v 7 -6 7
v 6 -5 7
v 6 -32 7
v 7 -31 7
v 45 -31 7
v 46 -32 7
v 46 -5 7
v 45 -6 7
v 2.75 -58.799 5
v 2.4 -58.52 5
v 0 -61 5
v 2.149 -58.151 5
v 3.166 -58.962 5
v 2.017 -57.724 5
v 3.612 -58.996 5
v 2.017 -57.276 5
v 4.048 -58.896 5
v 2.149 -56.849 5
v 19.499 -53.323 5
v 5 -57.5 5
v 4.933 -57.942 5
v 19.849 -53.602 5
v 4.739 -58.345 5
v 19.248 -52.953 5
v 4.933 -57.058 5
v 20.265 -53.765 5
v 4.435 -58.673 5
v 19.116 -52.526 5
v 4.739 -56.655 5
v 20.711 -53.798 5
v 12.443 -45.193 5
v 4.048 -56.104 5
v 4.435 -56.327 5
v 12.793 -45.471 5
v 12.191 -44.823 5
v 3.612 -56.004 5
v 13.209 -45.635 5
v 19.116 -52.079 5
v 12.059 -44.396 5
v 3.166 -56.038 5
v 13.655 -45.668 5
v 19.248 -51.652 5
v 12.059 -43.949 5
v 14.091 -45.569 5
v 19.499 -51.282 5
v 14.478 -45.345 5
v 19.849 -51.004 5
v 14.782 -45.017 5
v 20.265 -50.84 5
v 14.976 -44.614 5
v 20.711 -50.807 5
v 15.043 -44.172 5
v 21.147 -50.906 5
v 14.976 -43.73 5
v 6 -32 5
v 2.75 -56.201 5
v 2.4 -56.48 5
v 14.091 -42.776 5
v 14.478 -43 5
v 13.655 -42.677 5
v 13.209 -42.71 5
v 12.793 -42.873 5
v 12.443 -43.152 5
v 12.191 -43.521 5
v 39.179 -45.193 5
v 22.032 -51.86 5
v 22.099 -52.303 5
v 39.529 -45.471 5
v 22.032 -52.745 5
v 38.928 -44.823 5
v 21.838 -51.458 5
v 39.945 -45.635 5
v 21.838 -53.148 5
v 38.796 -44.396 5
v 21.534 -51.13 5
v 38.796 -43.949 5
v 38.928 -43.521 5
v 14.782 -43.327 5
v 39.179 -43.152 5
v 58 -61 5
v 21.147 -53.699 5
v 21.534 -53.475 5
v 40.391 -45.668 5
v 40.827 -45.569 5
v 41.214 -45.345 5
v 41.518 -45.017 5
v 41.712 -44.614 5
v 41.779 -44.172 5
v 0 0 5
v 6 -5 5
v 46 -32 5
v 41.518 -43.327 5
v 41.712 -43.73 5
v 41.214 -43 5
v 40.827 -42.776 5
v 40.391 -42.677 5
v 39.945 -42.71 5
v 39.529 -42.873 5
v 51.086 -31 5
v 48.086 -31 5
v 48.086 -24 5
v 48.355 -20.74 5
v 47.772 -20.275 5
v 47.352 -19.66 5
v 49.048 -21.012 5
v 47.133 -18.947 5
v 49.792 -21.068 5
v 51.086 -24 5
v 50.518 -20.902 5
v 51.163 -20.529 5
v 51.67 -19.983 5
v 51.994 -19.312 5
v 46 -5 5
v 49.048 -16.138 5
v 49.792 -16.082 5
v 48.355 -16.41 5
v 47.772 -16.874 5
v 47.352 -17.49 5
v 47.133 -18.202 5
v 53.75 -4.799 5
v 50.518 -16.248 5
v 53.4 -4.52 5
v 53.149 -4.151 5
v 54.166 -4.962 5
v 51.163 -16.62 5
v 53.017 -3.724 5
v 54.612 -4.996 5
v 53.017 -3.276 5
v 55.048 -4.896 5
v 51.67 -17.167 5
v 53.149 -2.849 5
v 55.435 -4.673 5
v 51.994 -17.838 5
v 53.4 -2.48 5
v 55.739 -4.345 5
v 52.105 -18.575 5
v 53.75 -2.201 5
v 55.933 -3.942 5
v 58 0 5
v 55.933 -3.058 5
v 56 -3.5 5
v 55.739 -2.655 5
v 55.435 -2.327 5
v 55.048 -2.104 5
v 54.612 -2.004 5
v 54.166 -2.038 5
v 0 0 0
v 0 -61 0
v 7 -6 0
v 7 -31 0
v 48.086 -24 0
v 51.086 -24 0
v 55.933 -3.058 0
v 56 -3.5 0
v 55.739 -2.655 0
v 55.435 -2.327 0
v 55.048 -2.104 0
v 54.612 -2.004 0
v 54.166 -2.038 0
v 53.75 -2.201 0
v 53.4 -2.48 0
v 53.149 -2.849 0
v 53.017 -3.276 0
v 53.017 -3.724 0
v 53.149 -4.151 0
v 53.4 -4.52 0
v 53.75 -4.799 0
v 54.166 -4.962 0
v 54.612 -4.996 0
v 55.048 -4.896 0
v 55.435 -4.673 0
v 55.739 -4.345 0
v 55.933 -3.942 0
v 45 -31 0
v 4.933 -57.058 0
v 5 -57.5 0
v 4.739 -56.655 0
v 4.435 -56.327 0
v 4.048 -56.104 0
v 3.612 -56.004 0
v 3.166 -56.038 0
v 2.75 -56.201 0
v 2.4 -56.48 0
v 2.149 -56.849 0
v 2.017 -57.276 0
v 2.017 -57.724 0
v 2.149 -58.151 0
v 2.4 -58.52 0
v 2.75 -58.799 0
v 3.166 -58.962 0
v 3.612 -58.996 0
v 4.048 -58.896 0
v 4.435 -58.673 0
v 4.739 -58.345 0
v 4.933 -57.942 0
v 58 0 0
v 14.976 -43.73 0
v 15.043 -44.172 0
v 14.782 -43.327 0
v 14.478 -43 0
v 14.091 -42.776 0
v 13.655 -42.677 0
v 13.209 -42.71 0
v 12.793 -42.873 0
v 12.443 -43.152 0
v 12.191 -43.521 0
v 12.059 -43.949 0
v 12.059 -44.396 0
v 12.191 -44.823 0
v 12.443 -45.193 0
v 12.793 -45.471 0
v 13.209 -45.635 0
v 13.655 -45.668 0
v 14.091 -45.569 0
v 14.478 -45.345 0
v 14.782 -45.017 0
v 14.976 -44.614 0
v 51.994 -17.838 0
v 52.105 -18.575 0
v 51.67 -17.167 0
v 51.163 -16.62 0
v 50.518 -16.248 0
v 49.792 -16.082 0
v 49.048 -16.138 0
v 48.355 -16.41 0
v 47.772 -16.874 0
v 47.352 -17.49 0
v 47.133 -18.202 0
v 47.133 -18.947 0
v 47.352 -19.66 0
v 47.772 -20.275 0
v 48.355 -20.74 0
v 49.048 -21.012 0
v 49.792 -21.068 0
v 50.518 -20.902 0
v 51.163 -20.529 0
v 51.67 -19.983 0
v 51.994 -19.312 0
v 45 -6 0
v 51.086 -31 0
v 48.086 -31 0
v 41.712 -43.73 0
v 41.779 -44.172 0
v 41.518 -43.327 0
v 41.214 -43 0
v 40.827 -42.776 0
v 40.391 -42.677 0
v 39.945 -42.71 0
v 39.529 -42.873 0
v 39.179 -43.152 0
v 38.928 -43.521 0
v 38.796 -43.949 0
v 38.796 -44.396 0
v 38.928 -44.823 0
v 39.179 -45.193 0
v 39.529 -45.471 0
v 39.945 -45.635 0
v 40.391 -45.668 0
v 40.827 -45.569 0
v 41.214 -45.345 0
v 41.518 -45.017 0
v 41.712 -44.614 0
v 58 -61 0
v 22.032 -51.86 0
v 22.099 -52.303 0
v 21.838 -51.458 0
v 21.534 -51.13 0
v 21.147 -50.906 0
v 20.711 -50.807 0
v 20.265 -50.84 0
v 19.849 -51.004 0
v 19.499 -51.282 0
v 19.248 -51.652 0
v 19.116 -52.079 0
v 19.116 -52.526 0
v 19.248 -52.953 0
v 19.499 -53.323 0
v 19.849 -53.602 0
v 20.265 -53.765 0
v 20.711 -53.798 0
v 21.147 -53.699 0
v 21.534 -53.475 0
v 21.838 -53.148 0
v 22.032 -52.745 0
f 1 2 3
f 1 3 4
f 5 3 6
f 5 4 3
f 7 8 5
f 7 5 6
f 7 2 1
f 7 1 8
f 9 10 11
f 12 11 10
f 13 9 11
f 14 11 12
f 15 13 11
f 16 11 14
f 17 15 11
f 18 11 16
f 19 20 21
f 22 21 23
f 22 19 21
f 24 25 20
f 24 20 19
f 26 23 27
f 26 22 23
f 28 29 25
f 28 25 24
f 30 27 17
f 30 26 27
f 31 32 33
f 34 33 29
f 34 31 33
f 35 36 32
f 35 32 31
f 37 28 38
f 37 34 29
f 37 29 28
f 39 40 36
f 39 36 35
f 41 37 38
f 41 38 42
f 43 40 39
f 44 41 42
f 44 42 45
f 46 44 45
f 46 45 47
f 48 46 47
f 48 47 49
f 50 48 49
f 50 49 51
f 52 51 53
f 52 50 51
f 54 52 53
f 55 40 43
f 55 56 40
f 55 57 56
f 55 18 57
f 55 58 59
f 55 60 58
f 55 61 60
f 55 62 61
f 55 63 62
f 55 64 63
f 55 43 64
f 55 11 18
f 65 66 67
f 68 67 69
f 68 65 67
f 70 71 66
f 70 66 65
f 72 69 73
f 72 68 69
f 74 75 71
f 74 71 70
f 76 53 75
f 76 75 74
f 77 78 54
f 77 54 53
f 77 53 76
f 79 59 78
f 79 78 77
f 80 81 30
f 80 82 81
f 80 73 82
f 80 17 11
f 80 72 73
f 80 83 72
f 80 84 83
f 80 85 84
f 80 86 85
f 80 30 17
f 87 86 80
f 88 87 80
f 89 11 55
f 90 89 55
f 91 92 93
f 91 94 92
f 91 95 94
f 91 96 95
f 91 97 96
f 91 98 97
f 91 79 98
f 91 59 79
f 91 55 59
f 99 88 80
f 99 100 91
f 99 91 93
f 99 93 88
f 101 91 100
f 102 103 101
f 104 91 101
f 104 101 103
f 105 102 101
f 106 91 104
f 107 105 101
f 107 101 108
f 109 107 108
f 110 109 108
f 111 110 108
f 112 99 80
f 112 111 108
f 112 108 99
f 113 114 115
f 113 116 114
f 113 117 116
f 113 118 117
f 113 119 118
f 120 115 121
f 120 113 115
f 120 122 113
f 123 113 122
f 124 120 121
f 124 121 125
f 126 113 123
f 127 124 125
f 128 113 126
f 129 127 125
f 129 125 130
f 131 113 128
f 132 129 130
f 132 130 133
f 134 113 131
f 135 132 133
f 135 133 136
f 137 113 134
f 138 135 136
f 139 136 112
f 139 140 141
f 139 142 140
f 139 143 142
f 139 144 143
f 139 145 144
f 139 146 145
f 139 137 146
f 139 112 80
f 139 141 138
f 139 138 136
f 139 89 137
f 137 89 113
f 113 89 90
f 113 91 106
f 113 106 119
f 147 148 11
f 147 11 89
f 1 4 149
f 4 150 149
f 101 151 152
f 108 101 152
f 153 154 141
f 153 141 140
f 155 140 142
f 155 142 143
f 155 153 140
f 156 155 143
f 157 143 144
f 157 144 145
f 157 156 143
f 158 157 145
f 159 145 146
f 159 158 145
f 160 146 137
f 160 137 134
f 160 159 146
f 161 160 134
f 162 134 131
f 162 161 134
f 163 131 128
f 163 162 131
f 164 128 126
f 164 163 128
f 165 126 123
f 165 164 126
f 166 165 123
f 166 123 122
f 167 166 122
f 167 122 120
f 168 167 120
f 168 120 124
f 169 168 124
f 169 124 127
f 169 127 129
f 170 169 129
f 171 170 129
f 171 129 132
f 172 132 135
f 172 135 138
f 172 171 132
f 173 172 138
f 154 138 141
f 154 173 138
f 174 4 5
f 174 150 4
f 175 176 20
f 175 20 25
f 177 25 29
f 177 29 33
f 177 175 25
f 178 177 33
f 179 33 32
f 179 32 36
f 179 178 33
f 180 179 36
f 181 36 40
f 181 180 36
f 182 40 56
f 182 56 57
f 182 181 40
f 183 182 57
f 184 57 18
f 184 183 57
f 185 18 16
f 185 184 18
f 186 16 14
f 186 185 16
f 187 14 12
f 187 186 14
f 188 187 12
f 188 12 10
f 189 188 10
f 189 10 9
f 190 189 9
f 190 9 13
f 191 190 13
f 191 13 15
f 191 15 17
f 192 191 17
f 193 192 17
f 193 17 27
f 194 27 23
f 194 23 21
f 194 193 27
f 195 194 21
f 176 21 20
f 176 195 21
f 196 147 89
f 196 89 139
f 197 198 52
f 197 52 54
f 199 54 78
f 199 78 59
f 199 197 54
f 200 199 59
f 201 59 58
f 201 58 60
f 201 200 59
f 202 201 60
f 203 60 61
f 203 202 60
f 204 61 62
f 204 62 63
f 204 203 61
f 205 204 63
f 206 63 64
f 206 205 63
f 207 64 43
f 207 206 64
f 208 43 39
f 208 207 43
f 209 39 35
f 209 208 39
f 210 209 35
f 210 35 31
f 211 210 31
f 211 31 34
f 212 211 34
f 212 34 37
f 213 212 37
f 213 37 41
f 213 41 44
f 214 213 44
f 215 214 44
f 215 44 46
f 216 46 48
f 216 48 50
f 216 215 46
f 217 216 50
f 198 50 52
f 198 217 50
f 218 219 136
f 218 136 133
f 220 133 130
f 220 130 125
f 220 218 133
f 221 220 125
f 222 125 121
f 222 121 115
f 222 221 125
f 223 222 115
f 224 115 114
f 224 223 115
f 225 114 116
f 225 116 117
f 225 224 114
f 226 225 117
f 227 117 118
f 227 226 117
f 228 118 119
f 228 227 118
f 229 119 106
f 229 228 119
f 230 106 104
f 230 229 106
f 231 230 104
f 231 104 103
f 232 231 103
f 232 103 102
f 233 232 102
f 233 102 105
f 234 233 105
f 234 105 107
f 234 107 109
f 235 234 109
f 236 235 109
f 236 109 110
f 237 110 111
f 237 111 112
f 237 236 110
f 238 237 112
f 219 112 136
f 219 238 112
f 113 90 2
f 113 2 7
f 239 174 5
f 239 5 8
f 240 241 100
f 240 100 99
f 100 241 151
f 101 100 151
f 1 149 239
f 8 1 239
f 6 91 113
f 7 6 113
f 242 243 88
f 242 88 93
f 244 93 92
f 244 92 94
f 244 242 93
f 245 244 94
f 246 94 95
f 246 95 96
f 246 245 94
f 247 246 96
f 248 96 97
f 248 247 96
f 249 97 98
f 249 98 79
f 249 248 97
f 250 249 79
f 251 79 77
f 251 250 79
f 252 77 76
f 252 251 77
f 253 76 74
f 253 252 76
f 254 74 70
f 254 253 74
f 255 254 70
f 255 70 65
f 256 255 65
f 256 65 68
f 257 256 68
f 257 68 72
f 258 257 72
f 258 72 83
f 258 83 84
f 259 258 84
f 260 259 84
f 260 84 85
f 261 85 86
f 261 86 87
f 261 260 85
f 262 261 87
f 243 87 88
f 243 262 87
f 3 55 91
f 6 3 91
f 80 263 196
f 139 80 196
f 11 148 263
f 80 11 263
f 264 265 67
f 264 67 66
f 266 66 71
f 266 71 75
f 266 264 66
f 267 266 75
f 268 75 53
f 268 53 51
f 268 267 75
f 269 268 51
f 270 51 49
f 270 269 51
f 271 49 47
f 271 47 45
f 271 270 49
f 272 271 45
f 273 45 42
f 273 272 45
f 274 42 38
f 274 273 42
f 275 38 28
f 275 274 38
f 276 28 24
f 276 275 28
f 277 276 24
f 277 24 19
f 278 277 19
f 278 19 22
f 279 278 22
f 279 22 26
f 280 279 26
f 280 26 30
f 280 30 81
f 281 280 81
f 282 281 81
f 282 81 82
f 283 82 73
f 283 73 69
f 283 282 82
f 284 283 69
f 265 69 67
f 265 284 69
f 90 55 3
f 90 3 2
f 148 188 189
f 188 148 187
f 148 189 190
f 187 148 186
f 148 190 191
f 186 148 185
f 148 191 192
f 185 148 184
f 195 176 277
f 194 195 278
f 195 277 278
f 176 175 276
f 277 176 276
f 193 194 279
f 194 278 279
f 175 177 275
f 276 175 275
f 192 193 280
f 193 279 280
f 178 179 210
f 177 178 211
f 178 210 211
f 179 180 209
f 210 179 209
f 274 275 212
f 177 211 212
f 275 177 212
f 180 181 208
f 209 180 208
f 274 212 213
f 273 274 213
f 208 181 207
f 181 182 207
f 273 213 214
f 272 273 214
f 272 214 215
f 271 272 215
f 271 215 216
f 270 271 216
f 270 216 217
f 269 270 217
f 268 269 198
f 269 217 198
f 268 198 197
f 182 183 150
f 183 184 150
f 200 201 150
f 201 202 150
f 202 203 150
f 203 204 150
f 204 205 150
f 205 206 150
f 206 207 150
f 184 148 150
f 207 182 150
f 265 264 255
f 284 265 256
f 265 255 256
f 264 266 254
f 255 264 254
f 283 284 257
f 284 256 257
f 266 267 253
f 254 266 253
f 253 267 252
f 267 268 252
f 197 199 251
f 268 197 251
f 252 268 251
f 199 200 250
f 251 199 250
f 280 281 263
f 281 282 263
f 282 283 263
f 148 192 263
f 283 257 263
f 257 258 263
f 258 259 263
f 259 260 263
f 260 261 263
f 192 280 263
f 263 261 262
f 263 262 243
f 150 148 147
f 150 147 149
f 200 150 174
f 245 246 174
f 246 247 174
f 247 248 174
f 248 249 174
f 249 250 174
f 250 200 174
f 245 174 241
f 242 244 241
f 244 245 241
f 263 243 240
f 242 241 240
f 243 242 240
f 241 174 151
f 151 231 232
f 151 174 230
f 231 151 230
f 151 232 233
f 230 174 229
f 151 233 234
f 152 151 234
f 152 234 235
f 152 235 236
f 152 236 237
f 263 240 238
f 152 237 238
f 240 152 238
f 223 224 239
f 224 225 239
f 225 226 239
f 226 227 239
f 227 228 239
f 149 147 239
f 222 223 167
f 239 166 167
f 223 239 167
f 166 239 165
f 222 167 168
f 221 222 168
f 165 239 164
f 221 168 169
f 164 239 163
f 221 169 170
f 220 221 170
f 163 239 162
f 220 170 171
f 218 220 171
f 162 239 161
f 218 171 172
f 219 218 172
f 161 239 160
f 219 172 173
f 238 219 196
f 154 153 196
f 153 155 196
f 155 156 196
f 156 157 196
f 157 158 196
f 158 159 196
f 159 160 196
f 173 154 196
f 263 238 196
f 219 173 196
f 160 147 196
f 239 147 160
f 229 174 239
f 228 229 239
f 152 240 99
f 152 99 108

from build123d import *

# Parameters (mm, degrees)
F0_W     = 58
F0_H     = 61
F0_R     = 1.5
F0_W_2   = 38
F0_H_2   = 25
F0_W_3   = 3
F0_H_3   = 7
F0_R_2   = 2.5
F1_DEPTH = 5
F2_W     = 40
F2_H     = 27
F2_W_2   = 38
F2_H_2   = 25
F3_DEPTH = 2


with BuildPart() as f1:
    # F0 (on Top) → F1 (new body)
    with BuildSketch(Plane.XY):
        with Locations((29, -30.5)):
            Rectangle(F0_W, F0_H)
        with Locations((3.5, -57.5)):
            Circle(F0_R, mode=Mode.SUBTRACT)
        with Locations((20.599063, -52.302592)):
            Circle(F0_R, mode=Mode.SUBTRACT)
        with Locations((13.542605, -44.172324)):
            Circle(F0_R, mode=Mode.SUBTRACT)
        with Locations((40.279038, -44.172324)):
            Circle(F0_R, mode=Mode.SUBTRACT)
        with Locations((26, -18.5)):
            Rectangle(F0_W_2, F0_H_2, mode=Mode.SUBTRACT)
        with Locations((49.58617, -27.5)):
            Rectangle(F0_W_3, F0_H_3, mode=Mode.SUBTRACT)
        with Locations((49.604766, -18.574871)):
            Circle(F0_R_2, mode=Mode.SUBTRACT)
        with Locations((54.5, -3.5)):
            Circle(F0_R, mode=Mode.SUBTRACT)
    extrude(amount=F1_DEPTH)

    # F2 (on face) → F3 (join)
    with BuildSketch(Plane.XY.offset(5)):
        with Locations((26, -18.5)):
            Rectangle(F2_W, F2_H)
        with Locations((26, -18.5)):
            Rectangle(F2_W_2, F2_H_2, mode=Mode.SUBTRACT)
    extrude(amount=F3_DEPTH)


solid = f1.part
